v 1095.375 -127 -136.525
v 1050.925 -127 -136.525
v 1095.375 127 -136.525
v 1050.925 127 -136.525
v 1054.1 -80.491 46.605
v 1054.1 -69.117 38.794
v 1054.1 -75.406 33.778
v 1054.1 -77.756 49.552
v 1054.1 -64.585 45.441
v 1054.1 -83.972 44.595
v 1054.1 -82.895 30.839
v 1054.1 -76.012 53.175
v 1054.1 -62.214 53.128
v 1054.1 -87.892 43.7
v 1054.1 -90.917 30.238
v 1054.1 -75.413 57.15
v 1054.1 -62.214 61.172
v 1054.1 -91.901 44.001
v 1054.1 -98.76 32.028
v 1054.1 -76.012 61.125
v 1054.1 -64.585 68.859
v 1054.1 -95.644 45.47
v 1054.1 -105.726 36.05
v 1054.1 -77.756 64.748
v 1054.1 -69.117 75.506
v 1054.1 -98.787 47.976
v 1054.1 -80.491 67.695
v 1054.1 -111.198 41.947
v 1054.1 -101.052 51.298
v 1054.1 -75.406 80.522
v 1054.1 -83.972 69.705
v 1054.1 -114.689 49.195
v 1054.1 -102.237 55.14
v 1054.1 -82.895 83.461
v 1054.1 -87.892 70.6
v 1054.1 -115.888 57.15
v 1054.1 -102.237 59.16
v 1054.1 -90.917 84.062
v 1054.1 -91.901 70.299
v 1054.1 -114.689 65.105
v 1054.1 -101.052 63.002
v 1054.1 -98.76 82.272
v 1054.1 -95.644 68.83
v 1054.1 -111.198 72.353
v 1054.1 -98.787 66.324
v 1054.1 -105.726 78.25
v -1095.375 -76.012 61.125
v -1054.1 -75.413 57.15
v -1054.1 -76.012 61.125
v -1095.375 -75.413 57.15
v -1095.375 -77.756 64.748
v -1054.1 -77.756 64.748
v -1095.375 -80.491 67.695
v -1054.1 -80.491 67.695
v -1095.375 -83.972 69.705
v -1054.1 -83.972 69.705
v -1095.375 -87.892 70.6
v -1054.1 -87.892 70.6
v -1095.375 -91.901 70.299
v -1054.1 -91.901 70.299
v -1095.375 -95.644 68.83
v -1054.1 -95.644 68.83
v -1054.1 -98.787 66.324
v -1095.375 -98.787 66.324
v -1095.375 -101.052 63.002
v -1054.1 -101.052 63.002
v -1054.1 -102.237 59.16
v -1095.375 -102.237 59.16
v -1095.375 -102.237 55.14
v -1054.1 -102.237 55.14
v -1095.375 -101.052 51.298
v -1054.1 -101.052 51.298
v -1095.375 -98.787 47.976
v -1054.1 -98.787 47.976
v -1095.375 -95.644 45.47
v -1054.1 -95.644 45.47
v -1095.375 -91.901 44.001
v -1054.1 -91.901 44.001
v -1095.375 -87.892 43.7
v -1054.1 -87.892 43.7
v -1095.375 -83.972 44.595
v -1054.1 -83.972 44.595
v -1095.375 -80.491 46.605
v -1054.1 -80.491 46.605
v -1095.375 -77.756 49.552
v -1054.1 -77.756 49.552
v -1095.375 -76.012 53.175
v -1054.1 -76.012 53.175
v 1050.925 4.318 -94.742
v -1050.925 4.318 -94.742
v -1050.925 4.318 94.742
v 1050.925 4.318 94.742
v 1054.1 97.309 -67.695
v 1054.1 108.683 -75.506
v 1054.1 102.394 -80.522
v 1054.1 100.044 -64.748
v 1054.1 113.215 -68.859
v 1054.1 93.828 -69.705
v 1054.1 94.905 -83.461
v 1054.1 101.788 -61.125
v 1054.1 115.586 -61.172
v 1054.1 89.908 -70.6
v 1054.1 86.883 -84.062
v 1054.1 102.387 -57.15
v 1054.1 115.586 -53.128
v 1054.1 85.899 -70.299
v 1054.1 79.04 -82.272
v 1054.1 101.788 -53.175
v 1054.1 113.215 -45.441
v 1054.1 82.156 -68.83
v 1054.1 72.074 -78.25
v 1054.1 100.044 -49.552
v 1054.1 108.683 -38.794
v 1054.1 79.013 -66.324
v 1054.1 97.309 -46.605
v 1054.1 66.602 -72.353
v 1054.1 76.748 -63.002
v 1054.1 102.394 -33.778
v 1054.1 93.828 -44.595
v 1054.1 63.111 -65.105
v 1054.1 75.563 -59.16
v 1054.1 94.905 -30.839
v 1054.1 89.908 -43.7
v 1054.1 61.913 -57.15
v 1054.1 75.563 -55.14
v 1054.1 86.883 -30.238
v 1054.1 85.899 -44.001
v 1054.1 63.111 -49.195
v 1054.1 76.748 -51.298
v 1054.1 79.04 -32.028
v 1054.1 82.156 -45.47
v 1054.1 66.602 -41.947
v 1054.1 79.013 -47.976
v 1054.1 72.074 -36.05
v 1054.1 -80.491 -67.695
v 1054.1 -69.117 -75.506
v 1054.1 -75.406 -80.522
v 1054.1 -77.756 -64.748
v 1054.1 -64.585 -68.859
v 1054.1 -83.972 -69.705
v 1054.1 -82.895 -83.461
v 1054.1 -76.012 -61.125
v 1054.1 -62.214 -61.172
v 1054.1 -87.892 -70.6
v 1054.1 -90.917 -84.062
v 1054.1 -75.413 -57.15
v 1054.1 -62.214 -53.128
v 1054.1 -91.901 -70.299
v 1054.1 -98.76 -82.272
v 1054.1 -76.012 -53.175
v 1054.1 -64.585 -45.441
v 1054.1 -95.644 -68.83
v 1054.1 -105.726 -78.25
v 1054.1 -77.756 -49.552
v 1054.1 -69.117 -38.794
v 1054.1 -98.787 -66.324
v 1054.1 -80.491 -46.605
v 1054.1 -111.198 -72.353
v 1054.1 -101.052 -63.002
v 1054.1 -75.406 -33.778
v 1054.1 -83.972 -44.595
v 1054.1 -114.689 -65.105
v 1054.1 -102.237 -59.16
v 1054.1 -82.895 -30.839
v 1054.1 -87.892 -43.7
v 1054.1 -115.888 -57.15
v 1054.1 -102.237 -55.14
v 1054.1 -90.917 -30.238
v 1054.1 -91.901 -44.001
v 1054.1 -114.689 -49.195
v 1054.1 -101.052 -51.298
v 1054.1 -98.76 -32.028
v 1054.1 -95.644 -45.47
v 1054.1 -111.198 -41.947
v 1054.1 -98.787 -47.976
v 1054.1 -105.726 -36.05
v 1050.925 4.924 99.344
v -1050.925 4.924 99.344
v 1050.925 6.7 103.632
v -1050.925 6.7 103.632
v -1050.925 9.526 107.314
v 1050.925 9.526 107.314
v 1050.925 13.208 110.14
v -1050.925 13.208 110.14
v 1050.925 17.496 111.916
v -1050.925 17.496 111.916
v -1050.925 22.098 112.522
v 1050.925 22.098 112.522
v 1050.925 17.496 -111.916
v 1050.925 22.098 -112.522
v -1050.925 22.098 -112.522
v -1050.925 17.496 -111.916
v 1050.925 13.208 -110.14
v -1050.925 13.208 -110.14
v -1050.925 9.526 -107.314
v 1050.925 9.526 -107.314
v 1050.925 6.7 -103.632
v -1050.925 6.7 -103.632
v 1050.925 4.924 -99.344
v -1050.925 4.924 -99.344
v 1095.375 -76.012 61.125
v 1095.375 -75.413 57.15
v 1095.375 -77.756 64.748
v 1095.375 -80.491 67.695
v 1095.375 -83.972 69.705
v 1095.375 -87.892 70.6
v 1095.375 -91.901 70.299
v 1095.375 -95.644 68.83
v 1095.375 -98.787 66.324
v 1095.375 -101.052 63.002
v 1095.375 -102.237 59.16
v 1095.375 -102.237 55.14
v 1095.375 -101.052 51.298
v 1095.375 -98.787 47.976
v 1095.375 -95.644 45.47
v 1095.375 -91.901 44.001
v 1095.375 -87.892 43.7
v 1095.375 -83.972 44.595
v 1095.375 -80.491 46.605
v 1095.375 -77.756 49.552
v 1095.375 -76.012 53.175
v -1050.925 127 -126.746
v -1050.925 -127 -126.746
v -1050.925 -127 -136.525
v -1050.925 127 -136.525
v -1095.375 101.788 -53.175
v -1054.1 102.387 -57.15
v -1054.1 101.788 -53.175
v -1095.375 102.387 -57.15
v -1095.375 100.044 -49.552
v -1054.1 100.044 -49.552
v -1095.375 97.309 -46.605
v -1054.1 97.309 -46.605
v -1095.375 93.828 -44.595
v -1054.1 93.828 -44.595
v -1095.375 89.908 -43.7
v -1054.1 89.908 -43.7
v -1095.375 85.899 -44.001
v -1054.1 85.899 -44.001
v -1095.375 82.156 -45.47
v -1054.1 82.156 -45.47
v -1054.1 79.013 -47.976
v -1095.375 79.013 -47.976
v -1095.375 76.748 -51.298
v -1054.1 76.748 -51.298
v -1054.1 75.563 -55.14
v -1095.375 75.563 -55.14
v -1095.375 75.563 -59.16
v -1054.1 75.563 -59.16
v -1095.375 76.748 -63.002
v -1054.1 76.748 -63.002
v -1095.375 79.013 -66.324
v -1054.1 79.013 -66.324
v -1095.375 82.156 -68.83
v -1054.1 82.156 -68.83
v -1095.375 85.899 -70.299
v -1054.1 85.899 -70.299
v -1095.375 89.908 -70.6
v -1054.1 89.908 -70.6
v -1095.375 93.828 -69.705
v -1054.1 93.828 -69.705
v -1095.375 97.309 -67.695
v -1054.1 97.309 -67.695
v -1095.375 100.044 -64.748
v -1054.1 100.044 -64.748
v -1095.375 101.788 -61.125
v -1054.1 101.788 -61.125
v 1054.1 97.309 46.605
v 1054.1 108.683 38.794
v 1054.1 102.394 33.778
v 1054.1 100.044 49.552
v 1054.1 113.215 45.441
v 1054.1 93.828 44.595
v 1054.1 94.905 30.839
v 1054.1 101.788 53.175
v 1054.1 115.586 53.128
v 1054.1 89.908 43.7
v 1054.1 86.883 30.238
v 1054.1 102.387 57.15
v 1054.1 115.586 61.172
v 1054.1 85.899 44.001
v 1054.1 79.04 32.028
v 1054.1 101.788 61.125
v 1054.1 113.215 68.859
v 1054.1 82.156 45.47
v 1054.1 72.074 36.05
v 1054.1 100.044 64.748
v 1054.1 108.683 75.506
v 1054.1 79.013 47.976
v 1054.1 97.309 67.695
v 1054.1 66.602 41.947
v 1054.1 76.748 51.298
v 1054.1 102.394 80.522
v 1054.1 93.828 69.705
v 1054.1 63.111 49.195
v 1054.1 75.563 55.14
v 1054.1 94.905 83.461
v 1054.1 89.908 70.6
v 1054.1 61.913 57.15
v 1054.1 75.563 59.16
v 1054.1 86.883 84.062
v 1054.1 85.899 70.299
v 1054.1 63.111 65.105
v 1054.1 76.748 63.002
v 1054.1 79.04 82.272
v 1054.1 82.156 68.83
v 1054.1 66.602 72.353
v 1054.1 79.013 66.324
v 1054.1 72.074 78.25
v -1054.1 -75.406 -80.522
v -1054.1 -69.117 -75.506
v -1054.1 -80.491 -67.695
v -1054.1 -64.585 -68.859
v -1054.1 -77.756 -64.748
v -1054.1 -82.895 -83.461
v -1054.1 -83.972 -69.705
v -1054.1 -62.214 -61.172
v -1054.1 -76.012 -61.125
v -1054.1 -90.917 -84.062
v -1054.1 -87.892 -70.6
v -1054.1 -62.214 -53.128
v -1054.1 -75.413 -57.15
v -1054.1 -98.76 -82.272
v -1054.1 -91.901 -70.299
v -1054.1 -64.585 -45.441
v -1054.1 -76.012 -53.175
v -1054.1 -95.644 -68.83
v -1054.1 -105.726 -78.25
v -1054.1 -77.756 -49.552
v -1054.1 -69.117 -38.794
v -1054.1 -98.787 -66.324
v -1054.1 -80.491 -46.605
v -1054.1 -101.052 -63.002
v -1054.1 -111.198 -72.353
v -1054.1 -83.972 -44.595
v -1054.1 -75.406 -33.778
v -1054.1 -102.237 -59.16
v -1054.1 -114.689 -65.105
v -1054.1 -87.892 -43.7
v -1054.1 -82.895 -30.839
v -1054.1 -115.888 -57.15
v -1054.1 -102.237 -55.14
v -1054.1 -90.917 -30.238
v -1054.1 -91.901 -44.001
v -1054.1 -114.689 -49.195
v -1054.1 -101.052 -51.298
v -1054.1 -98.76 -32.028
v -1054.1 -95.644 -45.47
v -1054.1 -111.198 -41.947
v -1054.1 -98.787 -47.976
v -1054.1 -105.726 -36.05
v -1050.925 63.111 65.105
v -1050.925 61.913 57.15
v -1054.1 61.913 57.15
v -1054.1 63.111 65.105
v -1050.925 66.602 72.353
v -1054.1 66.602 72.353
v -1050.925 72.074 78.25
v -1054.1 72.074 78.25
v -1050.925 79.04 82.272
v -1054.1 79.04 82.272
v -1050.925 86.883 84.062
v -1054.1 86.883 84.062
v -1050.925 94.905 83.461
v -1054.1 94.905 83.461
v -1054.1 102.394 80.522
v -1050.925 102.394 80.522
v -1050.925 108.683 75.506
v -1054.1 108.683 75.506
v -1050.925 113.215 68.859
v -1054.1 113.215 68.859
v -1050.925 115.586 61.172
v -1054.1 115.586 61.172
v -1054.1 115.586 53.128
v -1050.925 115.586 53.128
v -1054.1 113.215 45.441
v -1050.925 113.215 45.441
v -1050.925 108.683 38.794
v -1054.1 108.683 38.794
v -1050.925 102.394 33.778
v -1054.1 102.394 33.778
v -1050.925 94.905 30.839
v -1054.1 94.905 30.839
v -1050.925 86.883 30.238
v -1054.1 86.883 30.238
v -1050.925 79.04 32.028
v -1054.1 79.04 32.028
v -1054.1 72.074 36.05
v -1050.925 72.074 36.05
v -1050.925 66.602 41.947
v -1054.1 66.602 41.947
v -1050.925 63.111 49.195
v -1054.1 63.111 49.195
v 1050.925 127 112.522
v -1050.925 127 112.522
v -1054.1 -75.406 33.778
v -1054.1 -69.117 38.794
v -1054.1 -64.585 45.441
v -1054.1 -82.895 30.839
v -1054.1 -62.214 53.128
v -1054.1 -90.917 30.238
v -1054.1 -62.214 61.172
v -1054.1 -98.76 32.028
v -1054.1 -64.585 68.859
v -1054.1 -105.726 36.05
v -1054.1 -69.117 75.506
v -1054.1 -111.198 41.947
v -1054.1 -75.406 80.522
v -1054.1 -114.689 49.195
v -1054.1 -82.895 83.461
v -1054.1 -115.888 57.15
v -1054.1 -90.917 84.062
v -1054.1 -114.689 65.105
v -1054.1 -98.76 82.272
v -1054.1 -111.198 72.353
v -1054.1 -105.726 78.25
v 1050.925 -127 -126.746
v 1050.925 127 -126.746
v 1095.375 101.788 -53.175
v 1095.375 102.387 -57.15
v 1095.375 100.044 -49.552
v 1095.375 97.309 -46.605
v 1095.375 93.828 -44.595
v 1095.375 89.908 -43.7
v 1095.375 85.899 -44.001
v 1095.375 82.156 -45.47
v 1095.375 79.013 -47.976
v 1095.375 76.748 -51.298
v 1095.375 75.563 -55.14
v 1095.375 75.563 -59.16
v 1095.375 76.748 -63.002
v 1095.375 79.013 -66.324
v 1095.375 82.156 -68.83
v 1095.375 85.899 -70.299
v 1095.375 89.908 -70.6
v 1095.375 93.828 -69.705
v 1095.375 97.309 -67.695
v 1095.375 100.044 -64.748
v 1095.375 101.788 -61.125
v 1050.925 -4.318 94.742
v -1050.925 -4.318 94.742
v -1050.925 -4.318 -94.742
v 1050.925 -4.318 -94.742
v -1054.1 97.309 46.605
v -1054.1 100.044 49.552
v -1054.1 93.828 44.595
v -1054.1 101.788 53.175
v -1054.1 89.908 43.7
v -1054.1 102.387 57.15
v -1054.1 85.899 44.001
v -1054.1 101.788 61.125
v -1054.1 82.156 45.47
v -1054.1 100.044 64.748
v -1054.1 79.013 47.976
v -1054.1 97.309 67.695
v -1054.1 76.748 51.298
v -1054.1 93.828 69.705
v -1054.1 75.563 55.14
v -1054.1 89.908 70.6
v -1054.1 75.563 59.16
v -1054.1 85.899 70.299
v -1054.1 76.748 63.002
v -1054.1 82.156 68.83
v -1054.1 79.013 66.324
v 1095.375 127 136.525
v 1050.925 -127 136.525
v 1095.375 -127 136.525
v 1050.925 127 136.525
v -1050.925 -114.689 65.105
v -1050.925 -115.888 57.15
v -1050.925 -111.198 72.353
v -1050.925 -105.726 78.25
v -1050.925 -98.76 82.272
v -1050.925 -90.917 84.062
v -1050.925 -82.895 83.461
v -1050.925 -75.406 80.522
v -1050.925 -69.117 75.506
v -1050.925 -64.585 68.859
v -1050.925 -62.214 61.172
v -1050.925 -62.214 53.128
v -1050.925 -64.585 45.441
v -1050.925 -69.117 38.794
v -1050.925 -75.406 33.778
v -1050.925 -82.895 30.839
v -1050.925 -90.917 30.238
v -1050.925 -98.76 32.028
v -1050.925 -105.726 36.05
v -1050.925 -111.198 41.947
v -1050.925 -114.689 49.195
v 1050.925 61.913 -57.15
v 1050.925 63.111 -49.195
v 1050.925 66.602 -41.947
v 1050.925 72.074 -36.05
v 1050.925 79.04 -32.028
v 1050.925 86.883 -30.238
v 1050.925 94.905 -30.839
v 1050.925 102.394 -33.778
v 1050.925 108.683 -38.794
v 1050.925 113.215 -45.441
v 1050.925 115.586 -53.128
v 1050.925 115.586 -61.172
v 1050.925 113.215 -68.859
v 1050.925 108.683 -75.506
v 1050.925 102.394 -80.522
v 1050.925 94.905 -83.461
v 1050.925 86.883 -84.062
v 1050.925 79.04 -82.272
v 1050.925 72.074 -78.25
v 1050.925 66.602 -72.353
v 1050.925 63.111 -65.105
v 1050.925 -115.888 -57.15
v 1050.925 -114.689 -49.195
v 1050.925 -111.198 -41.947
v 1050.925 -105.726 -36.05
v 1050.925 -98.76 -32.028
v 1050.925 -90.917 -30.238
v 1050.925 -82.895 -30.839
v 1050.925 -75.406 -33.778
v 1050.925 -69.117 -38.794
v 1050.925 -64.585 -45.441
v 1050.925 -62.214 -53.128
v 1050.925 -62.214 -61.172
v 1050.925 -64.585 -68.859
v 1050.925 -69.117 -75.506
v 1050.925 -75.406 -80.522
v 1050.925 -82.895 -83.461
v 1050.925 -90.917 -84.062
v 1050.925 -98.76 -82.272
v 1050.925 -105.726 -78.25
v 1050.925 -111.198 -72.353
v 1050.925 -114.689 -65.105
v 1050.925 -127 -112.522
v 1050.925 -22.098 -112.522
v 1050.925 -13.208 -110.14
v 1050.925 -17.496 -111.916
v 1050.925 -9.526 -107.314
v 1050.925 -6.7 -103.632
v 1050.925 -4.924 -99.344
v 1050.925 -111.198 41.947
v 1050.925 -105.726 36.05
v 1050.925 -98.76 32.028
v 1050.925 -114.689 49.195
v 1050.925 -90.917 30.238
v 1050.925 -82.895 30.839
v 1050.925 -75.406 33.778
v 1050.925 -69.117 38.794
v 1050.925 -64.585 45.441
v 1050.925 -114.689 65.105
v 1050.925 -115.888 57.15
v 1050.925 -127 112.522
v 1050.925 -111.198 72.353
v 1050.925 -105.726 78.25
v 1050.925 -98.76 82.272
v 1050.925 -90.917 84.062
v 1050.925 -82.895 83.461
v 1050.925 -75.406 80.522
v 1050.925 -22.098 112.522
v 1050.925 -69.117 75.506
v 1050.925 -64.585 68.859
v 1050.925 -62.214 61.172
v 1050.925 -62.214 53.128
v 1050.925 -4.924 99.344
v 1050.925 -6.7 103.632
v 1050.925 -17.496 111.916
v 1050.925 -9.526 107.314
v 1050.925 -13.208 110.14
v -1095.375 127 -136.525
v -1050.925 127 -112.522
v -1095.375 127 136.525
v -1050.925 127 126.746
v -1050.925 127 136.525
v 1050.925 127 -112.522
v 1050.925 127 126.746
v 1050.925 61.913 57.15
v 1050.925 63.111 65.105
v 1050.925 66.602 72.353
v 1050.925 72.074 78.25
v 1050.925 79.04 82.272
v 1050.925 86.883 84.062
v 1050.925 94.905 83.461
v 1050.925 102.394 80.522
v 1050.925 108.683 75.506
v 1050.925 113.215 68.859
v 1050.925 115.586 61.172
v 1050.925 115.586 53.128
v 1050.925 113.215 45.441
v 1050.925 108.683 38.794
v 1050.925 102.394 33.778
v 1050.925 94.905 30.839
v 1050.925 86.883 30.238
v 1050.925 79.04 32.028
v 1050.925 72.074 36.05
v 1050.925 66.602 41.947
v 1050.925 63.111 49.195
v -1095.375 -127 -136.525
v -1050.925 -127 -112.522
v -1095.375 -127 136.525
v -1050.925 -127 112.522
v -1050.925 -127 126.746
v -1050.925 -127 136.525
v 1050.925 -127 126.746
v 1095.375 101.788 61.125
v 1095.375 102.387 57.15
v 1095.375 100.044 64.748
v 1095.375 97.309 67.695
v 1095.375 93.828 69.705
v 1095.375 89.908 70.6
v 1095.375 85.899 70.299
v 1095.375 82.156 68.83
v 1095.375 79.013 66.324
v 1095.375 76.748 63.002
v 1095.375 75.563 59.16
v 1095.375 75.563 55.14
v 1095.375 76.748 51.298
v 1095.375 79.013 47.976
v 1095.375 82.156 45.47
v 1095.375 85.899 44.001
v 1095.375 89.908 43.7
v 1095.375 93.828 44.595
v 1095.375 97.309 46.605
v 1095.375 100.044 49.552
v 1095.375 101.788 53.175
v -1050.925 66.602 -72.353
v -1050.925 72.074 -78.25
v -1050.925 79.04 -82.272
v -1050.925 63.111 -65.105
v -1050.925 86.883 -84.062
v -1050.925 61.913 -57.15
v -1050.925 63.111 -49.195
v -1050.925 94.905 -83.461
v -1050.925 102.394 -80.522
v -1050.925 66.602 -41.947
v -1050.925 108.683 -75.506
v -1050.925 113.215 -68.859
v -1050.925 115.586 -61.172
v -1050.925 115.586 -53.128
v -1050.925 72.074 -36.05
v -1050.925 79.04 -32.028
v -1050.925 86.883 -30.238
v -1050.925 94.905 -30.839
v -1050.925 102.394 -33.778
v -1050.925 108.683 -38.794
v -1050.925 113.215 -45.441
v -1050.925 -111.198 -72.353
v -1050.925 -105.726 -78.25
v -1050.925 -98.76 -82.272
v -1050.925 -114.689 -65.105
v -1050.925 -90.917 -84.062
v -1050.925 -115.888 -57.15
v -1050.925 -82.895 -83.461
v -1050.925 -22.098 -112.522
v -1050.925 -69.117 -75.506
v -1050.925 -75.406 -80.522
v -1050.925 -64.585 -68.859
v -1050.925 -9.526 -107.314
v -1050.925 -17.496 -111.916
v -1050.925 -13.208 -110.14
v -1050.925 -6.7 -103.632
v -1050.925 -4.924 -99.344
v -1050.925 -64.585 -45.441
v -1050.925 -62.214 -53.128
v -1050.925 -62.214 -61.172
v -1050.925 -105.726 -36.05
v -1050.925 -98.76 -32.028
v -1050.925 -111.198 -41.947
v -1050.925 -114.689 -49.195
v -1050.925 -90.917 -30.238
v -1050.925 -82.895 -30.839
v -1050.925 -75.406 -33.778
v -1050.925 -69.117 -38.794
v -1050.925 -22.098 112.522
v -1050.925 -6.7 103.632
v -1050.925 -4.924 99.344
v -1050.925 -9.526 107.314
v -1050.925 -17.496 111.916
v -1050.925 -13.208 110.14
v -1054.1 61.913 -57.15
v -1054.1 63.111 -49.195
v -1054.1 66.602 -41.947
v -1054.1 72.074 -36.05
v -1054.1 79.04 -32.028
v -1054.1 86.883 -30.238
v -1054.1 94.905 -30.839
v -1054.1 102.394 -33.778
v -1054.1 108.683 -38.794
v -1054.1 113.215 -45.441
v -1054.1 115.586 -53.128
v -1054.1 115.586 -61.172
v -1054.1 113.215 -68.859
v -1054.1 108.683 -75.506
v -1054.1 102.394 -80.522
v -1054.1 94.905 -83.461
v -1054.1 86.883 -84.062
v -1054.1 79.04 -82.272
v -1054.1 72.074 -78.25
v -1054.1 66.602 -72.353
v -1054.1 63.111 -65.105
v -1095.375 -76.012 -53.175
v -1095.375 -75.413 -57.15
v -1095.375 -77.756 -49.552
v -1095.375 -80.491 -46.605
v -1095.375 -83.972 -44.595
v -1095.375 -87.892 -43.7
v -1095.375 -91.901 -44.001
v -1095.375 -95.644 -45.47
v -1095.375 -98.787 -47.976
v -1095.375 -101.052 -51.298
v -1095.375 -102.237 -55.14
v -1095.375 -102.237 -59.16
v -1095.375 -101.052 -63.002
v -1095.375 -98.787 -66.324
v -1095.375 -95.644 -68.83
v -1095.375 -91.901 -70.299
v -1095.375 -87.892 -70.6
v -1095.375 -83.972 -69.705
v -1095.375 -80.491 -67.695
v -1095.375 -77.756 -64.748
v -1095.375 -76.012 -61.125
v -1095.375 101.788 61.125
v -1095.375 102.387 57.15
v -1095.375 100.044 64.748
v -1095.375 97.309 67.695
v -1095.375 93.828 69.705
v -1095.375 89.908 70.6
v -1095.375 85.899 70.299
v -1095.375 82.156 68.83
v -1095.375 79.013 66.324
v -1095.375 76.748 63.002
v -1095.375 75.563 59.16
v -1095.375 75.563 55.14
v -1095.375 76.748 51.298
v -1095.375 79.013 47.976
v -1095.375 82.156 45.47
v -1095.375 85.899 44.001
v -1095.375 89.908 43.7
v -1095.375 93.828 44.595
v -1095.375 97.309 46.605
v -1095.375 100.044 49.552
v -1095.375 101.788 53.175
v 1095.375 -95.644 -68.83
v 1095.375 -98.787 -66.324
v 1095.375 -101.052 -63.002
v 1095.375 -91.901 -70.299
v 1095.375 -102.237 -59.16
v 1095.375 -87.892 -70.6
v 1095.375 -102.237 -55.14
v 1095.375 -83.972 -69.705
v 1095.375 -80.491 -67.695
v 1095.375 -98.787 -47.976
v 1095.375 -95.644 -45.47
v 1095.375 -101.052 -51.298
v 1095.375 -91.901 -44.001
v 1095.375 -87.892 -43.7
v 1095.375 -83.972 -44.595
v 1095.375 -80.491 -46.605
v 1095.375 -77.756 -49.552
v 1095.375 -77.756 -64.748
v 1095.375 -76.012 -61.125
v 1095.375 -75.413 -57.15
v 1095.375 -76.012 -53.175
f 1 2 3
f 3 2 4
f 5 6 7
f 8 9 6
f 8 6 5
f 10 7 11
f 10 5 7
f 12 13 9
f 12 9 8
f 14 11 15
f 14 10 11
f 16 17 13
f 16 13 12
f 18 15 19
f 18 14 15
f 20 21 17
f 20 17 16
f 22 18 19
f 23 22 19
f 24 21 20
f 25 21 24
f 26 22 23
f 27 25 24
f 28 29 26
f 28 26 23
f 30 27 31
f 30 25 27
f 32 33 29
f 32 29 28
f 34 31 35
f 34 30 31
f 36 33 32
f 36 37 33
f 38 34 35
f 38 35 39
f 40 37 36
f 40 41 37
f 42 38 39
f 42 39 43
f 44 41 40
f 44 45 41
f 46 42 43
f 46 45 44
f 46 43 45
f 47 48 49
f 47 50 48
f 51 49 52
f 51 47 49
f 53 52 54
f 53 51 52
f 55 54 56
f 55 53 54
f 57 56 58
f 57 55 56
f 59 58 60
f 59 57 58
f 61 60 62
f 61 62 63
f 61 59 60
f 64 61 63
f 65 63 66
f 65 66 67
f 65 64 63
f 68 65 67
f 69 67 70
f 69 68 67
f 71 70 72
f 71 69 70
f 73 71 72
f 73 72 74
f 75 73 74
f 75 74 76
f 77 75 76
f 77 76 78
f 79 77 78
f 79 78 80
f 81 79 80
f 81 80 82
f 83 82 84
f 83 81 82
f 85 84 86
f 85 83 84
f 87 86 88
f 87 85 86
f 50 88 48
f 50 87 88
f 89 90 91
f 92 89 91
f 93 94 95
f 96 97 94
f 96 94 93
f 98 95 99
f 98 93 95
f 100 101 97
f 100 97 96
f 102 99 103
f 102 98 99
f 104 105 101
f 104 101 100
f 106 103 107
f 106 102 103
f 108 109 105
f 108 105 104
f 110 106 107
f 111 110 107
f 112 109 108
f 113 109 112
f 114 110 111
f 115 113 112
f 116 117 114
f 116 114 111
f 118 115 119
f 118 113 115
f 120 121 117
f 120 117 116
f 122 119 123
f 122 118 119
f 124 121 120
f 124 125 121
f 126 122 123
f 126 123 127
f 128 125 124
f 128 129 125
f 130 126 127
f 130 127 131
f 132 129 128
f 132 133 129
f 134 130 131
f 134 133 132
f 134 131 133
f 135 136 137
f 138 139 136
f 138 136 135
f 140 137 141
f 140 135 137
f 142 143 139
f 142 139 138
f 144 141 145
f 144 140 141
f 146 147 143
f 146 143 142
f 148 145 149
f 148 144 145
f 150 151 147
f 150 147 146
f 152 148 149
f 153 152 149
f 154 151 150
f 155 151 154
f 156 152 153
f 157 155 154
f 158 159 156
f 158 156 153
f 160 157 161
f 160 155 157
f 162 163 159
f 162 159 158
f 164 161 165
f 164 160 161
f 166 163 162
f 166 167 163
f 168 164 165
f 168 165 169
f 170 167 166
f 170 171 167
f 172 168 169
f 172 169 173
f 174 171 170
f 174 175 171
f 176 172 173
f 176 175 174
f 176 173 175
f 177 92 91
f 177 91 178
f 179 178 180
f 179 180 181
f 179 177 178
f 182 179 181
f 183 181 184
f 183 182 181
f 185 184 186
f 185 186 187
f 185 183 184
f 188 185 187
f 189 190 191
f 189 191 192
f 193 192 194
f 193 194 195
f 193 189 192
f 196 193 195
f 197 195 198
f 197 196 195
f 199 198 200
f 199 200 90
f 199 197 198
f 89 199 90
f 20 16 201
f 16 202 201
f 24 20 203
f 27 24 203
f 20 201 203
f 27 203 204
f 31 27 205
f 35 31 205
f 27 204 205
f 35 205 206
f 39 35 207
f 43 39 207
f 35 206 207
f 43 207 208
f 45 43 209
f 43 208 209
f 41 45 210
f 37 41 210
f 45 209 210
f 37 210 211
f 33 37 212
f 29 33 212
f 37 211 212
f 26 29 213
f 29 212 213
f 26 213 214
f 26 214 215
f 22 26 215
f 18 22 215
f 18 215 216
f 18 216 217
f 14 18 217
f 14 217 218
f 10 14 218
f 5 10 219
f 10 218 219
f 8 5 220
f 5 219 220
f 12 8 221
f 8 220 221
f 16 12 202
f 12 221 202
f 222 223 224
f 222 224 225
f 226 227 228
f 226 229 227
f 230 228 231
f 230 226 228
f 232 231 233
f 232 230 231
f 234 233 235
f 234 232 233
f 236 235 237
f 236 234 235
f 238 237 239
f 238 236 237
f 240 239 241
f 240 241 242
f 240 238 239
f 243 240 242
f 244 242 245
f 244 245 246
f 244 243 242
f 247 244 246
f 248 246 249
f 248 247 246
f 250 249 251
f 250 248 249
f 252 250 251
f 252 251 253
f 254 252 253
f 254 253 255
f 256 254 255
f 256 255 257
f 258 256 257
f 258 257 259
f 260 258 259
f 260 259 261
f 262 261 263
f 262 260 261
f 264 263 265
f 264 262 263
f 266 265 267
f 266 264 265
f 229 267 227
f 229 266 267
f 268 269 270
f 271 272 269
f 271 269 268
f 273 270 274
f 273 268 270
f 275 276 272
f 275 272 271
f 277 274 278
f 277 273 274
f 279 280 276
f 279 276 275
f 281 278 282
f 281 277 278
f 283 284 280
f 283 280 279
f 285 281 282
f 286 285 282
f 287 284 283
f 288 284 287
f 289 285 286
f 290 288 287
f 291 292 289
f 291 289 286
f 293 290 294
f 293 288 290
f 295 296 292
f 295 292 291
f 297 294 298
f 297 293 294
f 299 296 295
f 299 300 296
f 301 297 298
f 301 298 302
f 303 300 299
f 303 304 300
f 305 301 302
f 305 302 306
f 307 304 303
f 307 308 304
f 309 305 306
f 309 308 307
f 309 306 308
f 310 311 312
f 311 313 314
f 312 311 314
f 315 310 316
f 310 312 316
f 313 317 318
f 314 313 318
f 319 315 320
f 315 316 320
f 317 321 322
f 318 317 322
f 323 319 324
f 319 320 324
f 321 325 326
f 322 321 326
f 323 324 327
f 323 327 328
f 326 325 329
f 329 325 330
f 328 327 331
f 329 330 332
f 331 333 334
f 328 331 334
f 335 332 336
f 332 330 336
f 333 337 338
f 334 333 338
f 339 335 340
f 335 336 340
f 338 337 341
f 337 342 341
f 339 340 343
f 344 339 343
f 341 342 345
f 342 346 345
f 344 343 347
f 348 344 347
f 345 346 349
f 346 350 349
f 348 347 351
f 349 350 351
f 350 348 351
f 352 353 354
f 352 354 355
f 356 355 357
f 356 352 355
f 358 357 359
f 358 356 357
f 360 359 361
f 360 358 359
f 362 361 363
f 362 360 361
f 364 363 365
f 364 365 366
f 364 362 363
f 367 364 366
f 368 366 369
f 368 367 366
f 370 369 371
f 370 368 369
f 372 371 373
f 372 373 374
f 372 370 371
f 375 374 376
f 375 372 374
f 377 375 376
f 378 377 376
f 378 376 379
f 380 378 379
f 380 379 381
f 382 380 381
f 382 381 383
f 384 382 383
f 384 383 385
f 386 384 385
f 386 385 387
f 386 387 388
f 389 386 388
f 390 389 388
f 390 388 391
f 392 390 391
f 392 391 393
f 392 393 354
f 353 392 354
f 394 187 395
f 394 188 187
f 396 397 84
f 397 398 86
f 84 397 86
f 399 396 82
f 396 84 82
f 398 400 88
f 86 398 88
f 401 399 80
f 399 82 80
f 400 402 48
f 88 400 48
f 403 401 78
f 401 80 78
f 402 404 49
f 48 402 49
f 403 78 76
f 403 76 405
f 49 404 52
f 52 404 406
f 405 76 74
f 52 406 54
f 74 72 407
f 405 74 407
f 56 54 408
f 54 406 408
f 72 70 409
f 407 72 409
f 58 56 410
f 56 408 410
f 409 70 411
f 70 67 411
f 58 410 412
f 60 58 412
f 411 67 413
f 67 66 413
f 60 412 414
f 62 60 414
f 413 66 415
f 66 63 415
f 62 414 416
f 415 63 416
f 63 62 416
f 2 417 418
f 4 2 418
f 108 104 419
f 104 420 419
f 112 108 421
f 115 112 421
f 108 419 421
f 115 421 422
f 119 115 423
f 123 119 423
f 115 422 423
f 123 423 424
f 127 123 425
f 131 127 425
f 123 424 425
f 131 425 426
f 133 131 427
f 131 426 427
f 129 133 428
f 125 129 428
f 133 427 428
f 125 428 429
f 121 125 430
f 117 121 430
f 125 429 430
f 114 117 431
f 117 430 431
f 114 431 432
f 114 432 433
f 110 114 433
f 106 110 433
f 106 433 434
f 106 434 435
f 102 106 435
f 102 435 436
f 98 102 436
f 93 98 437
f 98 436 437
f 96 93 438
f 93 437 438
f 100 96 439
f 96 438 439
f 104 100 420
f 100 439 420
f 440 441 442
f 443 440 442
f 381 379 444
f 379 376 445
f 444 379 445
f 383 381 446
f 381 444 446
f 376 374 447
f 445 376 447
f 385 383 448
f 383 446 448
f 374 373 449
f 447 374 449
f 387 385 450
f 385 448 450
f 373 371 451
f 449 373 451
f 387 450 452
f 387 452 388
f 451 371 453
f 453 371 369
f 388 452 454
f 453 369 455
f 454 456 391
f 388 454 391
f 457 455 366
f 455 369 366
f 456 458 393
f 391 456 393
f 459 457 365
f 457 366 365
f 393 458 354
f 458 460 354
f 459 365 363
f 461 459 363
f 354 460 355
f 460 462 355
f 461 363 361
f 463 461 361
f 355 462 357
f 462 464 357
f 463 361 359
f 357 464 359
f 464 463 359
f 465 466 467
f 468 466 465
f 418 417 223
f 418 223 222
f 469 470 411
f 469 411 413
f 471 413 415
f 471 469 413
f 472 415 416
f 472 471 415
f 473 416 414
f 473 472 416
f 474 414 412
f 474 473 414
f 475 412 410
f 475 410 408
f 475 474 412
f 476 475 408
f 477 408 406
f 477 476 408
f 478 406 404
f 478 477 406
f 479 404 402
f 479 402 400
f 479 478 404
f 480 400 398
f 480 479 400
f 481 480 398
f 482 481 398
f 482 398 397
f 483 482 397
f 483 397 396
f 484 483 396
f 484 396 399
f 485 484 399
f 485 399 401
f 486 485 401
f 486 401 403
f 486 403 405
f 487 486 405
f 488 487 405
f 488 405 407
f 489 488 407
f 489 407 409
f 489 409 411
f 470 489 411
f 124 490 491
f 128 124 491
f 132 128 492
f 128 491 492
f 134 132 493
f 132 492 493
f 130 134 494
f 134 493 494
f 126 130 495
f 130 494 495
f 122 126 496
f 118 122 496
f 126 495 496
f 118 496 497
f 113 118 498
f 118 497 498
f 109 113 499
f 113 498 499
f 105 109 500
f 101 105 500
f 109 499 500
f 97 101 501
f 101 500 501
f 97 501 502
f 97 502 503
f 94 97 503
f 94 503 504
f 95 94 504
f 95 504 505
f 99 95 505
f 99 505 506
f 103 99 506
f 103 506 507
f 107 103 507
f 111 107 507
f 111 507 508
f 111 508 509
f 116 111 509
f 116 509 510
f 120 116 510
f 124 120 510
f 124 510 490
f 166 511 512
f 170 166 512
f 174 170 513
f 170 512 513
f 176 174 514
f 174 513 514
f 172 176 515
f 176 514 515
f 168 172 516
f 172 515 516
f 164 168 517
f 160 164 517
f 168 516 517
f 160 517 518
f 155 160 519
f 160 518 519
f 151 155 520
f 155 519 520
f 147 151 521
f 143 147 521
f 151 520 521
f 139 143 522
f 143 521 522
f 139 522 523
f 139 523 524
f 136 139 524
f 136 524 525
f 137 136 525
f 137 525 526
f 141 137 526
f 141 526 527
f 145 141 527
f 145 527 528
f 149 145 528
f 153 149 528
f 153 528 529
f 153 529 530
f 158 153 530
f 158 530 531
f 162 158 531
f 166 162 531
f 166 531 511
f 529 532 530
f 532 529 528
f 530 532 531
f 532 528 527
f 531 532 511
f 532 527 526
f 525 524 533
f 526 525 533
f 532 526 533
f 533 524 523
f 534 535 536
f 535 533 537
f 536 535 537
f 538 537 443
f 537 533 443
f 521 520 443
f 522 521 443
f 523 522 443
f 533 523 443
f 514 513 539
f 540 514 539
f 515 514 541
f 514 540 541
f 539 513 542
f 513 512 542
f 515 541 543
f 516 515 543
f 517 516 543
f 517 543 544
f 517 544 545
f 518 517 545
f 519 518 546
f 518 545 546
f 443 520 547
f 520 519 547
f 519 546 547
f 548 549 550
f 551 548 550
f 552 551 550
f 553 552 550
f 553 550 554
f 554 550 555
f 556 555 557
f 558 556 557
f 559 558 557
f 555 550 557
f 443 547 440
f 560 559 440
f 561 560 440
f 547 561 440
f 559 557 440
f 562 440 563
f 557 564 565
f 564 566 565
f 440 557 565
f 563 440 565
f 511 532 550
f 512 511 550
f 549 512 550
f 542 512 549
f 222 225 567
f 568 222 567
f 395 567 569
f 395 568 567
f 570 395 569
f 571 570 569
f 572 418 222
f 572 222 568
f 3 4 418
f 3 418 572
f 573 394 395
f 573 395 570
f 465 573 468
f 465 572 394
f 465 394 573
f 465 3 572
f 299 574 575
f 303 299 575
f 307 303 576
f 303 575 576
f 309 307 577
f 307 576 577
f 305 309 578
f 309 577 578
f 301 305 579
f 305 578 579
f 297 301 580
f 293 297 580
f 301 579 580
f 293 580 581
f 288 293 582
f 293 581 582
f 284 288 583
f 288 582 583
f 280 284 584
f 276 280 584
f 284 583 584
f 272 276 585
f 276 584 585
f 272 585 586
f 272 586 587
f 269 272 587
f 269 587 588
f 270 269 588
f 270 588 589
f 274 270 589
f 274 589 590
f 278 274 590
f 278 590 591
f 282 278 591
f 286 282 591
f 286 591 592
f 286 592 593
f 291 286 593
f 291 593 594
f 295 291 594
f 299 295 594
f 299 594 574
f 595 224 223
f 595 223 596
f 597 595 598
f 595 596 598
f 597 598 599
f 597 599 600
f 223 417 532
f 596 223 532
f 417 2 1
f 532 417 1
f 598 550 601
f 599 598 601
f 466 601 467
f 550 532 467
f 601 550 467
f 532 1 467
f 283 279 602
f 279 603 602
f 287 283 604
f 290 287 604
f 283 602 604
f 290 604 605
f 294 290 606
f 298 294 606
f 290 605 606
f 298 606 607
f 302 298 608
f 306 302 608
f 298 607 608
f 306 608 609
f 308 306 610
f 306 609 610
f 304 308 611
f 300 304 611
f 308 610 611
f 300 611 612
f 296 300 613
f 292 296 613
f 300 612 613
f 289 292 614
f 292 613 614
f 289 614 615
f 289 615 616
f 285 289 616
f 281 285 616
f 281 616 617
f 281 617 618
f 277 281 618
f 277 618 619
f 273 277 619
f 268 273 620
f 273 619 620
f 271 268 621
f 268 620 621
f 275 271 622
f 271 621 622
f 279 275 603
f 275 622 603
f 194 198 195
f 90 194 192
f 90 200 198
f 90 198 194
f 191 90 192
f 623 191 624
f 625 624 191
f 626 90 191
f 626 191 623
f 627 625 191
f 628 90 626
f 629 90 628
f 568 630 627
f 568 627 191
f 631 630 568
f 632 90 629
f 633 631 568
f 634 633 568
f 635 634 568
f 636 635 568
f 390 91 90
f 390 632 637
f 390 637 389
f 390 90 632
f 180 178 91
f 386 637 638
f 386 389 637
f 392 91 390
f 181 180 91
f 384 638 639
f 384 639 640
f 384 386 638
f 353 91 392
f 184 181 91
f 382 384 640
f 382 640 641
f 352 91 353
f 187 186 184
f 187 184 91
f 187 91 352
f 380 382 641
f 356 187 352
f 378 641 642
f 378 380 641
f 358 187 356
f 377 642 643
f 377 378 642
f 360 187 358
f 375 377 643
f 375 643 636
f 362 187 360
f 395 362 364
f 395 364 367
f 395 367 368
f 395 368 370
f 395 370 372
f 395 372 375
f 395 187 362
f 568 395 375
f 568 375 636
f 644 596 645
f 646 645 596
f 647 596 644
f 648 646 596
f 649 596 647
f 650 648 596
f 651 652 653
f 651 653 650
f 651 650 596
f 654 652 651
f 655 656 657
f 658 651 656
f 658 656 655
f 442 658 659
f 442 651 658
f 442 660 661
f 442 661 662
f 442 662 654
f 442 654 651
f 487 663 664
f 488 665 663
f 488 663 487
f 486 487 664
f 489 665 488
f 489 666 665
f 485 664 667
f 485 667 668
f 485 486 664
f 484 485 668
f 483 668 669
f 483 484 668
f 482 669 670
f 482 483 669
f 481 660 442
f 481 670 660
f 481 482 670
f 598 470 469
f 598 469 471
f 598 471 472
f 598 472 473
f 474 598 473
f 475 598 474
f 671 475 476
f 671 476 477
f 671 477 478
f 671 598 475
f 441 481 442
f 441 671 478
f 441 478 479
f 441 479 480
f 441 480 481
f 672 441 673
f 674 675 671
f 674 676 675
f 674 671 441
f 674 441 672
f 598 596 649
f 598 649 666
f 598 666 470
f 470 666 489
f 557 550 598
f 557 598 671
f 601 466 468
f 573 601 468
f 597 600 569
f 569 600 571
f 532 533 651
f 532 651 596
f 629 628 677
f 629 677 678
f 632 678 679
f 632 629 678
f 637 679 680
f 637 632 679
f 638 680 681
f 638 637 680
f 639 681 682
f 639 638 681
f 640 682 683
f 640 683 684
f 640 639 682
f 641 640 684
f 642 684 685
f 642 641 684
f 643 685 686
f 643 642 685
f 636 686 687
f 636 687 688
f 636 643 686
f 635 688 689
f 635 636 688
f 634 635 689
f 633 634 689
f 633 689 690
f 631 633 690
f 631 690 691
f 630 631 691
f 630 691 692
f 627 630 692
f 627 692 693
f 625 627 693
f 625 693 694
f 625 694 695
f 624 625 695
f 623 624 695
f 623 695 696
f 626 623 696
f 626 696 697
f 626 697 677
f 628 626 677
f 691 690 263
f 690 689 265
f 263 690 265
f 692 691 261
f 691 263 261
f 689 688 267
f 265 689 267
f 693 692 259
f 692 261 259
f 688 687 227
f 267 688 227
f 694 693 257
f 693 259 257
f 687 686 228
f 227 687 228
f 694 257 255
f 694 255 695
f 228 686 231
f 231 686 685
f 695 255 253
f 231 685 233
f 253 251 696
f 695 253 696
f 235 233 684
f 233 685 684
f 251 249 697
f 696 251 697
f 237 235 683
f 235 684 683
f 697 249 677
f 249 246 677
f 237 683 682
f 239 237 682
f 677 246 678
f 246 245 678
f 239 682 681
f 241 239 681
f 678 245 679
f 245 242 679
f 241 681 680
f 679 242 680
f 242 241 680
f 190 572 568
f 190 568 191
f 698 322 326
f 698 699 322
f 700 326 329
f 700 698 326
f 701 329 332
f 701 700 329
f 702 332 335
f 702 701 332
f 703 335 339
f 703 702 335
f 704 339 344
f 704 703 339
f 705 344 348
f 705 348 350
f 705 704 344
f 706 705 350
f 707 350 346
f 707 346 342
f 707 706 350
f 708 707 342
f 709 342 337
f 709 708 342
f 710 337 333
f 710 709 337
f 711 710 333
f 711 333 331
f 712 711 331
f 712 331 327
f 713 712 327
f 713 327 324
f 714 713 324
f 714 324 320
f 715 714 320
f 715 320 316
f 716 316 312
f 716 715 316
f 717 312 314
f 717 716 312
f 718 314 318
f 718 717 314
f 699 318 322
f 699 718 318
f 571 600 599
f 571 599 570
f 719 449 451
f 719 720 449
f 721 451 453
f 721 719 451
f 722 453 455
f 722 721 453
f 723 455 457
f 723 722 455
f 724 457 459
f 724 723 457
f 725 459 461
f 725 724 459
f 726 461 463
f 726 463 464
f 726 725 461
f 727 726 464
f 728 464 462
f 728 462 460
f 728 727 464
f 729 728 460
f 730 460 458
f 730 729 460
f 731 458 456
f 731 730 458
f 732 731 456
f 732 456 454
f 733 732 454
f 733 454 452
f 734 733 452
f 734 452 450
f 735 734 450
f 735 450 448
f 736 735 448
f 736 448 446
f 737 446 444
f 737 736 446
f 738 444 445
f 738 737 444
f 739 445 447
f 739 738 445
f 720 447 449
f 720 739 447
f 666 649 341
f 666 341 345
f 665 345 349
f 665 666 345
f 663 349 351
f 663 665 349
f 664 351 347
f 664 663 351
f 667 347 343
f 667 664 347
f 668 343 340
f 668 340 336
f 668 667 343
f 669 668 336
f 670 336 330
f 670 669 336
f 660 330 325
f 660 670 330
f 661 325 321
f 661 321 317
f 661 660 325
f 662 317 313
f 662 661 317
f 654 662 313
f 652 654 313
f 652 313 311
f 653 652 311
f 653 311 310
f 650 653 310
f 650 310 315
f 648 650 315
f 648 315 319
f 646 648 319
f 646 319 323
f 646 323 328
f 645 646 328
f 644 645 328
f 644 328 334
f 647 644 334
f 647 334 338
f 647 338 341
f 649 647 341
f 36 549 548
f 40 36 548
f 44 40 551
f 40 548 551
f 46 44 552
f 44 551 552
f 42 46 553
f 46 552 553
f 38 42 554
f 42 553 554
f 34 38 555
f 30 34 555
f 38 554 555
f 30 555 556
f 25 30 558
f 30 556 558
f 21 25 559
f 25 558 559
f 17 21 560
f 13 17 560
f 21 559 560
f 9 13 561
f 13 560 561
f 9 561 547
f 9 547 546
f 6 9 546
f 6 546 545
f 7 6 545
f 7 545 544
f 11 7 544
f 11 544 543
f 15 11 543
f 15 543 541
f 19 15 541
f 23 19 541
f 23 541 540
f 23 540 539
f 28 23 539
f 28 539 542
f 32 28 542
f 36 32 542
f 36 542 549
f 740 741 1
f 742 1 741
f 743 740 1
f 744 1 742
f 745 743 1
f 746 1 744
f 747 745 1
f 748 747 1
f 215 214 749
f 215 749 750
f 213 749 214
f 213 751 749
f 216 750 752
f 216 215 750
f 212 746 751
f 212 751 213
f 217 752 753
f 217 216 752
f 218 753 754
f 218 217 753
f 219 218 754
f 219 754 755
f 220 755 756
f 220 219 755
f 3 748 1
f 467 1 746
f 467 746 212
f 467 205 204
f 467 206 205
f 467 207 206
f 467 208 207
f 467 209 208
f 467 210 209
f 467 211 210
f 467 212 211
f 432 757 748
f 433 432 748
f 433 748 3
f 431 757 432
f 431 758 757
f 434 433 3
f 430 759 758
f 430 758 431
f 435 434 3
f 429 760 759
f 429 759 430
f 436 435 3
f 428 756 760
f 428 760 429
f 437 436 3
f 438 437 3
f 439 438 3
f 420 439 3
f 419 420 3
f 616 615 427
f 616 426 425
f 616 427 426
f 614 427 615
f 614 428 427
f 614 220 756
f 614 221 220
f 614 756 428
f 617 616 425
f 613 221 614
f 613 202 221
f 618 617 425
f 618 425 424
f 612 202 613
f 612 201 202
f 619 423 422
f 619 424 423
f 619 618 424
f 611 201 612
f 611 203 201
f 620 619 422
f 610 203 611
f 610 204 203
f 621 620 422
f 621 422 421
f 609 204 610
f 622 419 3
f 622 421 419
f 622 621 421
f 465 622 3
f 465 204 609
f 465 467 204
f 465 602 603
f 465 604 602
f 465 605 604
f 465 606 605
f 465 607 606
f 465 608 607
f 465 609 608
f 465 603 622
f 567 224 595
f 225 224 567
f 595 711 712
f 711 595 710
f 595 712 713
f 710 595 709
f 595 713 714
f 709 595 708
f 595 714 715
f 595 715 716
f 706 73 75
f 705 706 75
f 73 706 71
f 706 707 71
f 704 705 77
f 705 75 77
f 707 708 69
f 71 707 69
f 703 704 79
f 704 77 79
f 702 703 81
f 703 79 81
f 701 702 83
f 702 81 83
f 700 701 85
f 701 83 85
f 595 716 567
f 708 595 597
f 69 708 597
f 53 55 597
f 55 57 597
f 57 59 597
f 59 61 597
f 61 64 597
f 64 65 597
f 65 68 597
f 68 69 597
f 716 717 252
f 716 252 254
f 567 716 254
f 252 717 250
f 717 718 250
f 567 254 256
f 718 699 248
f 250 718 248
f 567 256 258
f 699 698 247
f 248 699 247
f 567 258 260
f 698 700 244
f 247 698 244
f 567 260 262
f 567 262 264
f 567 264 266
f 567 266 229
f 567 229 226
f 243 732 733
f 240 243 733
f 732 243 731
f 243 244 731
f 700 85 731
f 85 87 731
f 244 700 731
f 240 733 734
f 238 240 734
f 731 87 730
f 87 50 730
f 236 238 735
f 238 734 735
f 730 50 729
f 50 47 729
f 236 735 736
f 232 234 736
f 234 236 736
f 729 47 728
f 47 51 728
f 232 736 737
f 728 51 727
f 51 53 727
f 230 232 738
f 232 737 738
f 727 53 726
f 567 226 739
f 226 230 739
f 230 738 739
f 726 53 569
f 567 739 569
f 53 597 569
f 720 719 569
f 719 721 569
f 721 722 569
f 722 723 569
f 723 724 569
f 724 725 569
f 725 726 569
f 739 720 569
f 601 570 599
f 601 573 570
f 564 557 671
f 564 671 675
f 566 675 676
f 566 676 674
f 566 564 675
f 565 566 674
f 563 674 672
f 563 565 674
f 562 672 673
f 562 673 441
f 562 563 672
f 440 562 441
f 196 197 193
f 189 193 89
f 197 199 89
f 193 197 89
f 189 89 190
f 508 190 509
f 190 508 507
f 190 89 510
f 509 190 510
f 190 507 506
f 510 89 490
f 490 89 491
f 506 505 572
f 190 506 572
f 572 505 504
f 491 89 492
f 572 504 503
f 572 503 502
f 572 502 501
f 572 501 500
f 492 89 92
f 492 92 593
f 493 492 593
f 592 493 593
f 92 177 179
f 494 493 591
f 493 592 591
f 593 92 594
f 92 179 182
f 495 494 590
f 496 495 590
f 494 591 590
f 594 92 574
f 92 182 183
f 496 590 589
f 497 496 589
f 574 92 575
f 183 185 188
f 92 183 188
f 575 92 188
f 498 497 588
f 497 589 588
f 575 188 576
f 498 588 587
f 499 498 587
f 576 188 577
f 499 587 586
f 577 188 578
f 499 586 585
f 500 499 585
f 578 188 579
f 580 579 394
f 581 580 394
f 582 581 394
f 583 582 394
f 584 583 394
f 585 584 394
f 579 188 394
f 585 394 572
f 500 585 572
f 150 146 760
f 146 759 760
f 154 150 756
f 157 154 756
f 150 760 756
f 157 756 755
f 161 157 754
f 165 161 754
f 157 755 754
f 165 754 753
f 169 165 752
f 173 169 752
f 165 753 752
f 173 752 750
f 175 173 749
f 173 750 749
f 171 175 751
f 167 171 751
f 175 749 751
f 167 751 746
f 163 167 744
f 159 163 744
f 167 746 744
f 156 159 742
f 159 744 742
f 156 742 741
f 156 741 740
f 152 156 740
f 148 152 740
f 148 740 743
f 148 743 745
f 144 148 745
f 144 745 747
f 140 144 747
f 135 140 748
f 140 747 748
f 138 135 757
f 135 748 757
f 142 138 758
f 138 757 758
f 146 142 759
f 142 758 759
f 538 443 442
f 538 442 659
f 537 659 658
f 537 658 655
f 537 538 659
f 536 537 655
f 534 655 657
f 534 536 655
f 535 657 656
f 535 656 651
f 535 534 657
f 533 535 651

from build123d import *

# Parameters (mm, degrees)
F1_DEPTH       = 1050.925
F2_W           = 254
F2_H           = 273.05
F3_DEPTH       = 44.45
F5_D           = 26.9748
F5_CBORE_D     = 53.975
F5_CBORE_DEPTH = 3.175


with BuildPart() as f1:
    # F0 (on Right) → F1 (new body, symmetric)
    with BuildSketch(Plane.YZ):
        with BuildLine():
            Line((127, 126.746), (-127, 126.746))
            Line((-127, 126.746), (-127, 112.522))
            Line((-127, 112.522), (-22.098, 112.522))
            ThreePointArc((-22.098, 112.522), (-9.5256414305, 107.3143585695), (-4.318, 94.742))
            Line((-4.318, 94.742), (-4.318, -94.742))
            ThreePointArc((-4.318, -94.742), (-9.5256414305, -107.3143585695), (-22.098, -112.522))
            Line((-22.098, -112.522), (-127, -112.522))
            Line((-127, -112.522), (-127, -126.746))
            Line((-127, -126.746), (127, -126.746))
            Line((127, -126.746), (127, -112.522))
            Line((127, -112.522), (22.098, -112.522))
            ThreePointArc((22.098, -112.522), (9.5256414305, -107.3143585695), (4.318, -94.742))
            Line((4.318, -94.742), (4.318, 94.742))
            ThreePointArc((4.318, 94.742), (9.5256414305, 107.3143585695), (22.098, 112.522))
            Line((22.098, 112.522), (127, 112.522))
            Line((127, 112.522), (127, 126.746))
        make_face()
    extrude(amount=F1_DEPTH, both=True)

    # F2 (on face) → F3 (join)
    with BuildSketch(Plane.YZ.offset(1050.925)):
        Rectangle(F2_W, F2_H)
    extrude(amount=F3_DEPTH)

    # F5 (through all)
    with Locations(Plane(origin=(1050.925, 0, 0), x_dir=(0, -1, 0), z_dir=(-1, 0, 0))):
        with Locations((-88.9, 57.15), (-88.9, -57.15), (88.9, 57.15), (88.9, -57.15)):
            CounterBoreHole(F5_D / 2, F5_CBORE_D / 2, F5_CBORE_DEPTH)

    # F6: F1 across plane


with BuildPart() as f1_1:
    add(f1.part)
    add(f1.part.mirror(Plane.YZ))


solid = f1_1.part
